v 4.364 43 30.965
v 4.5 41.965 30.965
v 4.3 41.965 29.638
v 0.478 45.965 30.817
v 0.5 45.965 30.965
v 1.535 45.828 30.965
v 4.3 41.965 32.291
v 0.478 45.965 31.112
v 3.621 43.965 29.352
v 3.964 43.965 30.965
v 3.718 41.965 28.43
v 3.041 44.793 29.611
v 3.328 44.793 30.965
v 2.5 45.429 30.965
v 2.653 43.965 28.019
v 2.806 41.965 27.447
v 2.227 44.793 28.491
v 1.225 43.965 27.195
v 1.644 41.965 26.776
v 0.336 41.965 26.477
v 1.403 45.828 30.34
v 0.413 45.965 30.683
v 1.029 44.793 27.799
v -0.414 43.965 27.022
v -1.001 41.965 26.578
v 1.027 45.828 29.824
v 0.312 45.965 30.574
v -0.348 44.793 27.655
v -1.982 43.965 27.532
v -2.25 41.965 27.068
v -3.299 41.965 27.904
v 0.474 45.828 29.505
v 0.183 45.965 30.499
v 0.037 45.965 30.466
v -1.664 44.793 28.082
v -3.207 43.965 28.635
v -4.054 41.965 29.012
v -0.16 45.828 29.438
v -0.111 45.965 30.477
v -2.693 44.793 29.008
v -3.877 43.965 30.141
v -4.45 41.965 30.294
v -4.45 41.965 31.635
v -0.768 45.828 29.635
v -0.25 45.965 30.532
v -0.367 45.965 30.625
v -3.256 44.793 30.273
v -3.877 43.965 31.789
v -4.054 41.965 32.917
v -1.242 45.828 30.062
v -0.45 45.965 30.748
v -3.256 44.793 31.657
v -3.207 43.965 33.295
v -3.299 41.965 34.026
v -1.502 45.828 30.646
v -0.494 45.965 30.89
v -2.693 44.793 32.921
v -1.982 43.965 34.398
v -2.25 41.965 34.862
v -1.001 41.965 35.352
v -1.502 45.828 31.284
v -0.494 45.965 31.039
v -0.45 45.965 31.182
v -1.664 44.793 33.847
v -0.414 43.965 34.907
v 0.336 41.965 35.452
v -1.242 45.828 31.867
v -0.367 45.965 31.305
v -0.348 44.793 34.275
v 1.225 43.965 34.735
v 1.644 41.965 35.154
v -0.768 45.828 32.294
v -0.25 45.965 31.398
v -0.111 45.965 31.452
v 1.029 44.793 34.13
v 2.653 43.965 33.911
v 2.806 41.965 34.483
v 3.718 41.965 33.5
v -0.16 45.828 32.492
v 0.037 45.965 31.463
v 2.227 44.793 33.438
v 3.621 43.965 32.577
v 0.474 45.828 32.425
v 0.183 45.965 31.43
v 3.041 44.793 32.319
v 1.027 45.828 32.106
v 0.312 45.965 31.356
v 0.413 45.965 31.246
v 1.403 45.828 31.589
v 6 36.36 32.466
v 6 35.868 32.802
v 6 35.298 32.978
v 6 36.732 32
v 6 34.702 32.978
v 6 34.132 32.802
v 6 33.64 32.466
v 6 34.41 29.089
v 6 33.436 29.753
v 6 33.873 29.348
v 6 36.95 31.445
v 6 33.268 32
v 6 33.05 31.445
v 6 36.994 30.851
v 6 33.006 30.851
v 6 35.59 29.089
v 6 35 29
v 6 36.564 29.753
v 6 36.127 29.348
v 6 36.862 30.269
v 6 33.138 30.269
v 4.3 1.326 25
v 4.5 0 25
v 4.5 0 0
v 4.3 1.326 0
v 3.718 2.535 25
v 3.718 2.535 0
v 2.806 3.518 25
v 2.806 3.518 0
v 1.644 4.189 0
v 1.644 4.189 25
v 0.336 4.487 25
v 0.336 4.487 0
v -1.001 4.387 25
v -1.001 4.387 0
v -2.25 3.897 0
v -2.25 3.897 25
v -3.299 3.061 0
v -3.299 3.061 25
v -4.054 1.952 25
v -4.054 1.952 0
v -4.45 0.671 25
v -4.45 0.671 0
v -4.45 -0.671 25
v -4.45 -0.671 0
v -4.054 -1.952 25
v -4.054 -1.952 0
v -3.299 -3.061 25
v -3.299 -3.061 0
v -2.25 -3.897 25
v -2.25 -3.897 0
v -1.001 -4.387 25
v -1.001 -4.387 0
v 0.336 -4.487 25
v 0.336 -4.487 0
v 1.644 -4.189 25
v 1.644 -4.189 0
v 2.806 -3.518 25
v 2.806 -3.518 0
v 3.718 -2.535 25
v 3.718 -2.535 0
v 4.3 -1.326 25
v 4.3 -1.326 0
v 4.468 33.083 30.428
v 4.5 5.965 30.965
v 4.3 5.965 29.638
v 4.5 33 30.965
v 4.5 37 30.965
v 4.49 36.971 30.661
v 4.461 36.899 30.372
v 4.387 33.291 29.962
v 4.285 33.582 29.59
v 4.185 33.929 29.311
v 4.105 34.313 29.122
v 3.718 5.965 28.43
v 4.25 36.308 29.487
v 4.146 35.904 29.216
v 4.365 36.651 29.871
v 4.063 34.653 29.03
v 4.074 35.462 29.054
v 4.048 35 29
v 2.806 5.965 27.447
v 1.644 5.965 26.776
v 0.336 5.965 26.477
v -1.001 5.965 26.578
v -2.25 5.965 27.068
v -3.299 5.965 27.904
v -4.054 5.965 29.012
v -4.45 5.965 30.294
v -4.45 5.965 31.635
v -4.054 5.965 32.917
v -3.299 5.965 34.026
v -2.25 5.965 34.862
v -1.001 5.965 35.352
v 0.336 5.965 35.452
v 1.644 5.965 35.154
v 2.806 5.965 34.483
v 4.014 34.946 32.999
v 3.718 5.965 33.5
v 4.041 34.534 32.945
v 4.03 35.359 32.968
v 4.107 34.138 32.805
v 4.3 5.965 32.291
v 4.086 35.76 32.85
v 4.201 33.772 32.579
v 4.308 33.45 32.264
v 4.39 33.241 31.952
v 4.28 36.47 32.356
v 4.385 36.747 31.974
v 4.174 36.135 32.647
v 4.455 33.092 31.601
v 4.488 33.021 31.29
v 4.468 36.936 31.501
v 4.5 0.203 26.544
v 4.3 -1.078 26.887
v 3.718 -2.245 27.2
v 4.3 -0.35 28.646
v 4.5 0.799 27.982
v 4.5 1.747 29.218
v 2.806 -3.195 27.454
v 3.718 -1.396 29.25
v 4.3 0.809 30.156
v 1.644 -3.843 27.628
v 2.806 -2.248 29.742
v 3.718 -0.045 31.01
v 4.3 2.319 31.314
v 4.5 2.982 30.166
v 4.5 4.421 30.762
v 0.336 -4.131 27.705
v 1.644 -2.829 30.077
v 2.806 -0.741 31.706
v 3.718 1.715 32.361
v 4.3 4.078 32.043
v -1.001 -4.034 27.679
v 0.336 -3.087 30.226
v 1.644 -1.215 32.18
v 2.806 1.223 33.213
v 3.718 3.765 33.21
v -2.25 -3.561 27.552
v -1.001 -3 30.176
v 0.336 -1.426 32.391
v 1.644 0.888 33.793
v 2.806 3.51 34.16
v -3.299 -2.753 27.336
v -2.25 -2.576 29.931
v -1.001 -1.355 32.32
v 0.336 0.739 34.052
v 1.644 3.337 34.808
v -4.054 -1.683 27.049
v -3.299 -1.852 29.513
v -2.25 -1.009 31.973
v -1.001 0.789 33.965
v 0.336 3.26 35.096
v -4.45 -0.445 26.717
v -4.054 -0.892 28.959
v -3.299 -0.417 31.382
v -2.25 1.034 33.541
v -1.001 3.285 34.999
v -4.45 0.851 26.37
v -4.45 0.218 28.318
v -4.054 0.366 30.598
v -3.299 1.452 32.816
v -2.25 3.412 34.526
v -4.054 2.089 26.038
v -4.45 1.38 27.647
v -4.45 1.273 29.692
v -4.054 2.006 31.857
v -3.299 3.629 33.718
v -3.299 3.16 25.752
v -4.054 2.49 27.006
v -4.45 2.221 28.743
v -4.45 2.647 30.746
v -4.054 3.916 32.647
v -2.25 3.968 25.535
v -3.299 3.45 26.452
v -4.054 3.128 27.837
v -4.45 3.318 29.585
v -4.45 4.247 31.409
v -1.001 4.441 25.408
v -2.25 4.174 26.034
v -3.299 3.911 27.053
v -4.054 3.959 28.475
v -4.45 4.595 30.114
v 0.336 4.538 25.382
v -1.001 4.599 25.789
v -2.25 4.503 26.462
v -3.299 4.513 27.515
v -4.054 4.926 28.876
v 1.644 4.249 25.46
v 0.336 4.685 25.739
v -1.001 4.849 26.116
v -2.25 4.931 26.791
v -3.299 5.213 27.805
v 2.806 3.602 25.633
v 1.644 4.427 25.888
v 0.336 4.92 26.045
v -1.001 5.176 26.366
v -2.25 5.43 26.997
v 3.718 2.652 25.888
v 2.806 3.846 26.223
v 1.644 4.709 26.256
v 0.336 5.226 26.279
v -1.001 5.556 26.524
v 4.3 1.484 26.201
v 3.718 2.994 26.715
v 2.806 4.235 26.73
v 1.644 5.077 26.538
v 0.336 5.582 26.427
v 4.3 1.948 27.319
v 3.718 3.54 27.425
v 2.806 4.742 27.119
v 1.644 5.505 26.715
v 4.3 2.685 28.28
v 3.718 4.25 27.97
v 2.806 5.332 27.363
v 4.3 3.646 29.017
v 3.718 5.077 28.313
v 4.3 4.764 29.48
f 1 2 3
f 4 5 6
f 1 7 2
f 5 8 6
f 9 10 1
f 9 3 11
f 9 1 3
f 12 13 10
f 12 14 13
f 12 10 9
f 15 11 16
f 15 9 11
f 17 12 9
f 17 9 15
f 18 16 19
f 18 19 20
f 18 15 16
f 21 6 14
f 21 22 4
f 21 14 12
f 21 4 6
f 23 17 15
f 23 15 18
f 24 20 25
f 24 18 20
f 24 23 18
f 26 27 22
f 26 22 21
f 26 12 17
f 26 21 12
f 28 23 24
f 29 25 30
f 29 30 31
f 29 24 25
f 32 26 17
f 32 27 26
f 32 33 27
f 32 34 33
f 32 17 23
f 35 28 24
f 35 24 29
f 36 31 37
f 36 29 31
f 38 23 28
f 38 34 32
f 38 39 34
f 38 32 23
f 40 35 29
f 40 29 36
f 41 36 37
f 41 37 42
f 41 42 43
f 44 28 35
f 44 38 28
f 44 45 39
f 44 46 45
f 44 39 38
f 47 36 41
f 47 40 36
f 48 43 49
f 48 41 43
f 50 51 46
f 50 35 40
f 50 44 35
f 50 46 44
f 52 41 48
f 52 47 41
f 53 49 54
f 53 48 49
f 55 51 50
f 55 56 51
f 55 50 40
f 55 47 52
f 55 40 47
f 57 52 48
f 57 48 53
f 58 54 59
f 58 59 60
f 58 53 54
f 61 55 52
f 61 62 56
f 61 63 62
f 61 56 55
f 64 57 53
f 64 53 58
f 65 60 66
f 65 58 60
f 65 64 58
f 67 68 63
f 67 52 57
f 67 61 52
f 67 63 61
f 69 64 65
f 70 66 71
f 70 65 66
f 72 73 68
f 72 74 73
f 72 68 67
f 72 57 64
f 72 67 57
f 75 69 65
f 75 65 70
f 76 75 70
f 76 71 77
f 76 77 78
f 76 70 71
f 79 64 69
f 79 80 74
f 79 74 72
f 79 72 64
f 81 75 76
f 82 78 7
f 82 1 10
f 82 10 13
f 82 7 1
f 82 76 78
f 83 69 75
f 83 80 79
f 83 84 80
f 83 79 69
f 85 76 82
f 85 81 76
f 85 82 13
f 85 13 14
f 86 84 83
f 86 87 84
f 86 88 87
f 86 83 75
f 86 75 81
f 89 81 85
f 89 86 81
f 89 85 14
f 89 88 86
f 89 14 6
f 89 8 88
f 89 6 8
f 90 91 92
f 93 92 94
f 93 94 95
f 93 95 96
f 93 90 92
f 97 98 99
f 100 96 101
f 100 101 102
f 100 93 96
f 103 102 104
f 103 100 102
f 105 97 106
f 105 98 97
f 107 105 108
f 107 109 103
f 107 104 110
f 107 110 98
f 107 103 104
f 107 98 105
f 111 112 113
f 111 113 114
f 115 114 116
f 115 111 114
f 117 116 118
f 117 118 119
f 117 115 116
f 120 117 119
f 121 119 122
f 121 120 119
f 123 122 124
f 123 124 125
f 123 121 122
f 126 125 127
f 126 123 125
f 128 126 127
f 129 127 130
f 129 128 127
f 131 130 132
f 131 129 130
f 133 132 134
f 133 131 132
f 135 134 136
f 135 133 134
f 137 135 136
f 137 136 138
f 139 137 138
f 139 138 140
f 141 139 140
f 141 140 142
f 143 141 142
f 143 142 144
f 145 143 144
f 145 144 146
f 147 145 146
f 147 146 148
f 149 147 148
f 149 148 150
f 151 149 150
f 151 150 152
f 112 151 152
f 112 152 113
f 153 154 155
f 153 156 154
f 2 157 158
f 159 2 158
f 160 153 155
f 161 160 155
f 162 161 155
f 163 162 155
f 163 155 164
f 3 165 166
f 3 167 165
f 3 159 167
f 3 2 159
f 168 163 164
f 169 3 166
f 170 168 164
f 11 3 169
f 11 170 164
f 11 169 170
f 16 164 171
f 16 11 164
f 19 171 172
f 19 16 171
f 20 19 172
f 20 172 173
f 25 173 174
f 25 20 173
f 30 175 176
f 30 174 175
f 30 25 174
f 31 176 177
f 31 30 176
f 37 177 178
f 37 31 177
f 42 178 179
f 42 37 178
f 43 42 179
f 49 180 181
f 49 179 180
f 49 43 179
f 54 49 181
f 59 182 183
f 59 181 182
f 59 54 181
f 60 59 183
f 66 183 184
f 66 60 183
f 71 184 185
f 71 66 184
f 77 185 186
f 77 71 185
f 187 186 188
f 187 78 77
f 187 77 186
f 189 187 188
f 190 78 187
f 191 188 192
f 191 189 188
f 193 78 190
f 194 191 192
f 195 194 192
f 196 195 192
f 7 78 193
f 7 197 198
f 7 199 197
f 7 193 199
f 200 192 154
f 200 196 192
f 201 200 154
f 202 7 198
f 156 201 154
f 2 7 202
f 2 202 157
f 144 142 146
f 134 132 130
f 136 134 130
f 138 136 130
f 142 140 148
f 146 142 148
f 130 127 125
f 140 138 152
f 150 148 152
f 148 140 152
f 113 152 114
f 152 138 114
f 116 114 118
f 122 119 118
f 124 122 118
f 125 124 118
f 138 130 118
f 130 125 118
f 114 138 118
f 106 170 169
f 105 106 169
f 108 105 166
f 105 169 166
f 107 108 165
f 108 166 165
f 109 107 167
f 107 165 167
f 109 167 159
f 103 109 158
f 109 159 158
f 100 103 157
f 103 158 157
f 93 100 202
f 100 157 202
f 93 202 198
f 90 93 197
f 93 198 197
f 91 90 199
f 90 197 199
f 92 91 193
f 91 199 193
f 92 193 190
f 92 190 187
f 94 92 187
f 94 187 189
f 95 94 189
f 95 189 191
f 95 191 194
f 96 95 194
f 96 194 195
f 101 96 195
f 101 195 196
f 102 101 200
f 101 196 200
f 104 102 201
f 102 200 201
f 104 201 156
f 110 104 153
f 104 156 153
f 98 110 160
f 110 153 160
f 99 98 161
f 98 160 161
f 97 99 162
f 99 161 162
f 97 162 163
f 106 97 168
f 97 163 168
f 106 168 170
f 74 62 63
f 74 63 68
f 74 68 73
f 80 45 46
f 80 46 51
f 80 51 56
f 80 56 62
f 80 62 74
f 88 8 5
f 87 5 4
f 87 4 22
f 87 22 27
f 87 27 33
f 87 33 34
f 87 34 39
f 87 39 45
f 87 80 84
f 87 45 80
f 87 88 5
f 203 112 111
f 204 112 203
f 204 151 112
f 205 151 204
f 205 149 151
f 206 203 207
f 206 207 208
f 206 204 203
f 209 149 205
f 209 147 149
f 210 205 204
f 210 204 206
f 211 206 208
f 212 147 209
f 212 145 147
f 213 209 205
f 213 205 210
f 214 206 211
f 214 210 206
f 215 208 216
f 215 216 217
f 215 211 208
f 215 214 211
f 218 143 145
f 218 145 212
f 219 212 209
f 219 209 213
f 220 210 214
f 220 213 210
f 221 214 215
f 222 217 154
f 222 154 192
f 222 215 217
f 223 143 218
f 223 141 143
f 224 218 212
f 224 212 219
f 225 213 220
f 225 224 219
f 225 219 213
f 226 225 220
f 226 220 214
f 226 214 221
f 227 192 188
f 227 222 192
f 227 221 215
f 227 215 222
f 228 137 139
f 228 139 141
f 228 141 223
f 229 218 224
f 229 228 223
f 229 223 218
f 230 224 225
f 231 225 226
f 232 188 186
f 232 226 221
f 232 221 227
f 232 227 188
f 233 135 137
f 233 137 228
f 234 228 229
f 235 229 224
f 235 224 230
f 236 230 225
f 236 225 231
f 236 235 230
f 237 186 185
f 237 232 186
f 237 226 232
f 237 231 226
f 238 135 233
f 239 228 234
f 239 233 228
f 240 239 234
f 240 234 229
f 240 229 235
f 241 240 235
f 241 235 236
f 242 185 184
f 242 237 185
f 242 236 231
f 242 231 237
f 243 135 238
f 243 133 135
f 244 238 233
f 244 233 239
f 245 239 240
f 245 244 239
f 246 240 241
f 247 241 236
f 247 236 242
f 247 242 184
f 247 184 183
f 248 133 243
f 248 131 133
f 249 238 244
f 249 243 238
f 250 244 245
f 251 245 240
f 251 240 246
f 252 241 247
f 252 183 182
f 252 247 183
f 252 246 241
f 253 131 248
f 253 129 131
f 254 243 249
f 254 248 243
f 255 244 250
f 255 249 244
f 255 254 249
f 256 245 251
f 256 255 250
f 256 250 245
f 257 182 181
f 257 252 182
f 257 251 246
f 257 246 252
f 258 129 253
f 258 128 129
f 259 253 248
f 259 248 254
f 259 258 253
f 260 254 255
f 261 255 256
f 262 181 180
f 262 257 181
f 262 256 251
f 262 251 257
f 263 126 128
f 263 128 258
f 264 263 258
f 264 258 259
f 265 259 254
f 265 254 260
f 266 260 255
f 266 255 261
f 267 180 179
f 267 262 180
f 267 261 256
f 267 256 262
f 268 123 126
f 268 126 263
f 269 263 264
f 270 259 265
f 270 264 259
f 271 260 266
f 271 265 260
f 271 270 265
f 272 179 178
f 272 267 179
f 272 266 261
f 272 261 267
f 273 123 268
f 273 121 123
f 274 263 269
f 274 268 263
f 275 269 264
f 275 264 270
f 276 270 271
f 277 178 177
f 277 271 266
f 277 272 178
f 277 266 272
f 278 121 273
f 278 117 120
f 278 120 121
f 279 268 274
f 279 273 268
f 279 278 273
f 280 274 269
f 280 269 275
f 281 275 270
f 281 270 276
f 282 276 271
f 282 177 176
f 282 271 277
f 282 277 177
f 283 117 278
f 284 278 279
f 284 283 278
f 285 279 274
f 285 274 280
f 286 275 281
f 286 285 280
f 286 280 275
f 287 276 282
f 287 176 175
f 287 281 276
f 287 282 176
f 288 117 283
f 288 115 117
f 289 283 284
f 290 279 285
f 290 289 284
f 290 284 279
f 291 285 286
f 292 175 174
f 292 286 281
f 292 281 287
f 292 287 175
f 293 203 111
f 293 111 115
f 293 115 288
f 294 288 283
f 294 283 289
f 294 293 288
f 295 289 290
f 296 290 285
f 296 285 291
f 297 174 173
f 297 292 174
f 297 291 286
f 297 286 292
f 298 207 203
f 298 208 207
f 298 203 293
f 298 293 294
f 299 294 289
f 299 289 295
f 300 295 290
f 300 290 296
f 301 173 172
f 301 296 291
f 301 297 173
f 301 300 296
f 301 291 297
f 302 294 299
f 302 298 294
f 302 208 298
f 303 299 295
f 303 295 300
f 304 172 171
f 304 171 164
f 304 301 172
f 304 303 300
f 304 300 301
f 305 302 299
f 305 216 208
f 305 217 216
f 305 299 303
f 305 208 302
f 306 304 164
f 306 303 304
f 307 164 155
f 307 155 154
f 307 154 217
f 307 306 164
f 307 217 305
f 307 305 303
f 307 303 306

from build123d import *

# Parameters (mm, degrees)
SKETCH2_R           = 4.5
FILLET2_R           = 4
SKETCH4_R           = 2
BOSS_EXTRUDE1_DEPTH = 6


with BuildPart() as part:
    # Sweep3: sweep along a path in Sketch3
    with BuildLine(Plane(origin=(0, 0, 0), x_dir=(0, 0, -1), z_dir=(1, 0, 0))) as sweep3_path:
        Line((0, 0), (-25, 0))
        ThreePointArc((-25, 0), (-29.217732486, 1.747041998), (-30.964774484, 5.964774484))
        Line((-30.964774484, 5.964774484), (-30.964774484, 45.964774484))
    # Sketch2 → Sweep3 (sweep)
    with BuildSketch(Plane.XY):
        Circle(SKETCH2_R)
    sweep(path=sweep3_path.line)

    # Fillet2
    fillet2_edges = [part.edges().sort_by_distance(p)[0] for p in [
        (-4.5, 45.964774484, 30.964774484),
    ]]
    fillet(fillet2_edges, radius=FILLET2_R)

    # Sketch4 → Boss-Extrude1 (add)
    with BuildSketch(Plane(origin=(0, 0, 0), x_dir=(0, 0, -1), z_dir=(1, 0, 0))):
        with Locations((-31, 35)):
            Circle(SKETCH4_R)
    extrude(amount=BOSS_EXTRUDE1_DEPTH)


solid = part.part
